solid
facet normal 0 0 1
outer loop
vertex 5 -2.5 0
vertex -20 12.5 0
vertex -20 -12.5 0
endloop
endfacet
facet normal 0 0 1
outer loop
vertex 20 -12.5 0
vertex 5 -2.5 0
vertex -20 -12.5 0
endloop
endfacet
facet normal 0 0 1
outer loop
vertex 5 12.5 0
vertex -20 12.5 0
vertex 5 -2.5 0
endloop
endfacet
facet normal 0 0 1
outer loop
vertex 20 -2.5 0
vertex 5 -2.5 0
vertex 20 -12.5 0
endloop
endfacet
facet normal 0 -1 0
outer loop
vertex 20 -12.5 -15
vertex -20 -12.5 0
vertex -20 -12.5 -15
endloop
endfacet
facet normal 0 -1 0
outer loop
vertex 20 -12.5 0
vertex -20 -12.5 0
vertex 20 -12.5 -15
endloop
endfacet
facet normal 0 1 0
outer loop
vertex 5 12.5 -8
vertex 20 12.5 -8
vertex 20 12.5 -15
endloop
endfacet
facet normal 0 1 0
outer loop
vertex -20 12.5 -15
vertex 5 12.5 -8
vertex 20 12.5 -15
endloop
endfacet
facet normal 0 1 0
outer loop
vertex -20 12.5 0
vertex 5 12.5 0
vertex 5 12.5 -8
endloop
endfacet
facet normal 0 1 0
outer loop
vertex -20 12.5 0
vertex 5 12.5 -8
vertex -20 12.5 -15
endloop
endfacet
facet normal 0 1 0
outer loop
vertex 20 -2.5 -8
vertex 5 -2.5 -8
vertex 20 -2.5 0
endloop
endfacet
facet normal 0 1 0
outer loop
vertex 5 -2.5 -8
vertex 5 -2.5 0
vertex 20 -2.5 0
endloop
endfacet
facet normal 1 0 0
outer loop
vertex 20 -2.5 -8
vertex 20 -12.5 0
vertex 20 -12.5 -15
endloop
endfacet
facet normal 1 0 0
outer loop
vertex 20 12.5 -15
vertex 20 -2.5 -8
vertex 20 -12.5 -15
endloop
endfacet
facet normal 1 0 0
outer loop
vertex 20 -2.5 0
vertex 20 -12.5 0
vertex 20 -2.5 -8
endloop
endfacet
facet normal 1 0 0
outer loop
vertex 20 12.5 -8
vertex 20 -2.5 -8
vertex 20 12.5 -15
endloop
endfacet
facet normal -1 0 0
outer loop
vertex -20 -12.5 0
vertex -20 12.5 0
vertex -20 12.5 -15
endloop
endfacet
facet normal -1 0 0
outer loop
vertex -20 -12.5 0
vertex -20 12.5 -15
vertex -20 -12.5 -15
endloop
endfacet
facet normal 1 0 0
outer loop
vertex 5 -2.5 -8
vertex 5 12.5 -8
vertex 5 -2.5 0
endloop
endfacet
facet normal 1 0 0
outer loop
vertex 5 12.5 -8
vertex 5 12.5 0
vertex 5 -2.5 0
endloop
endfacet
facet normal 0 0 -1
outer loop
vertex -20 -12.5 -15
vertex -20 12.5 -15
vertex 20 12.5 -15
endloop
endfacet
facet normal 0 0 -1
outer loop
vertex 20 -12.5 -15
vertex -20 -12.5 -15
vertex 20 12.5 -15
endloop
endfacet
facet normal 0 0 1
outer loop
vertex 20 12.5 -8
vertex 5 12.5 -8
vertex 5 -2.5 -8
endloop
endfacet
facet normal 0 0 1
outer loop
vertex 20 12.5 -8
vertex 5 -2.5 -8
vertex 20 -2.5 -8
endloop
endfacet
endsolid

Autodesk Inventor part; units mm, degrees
ref_plane "YZ Plane" through (0, 0, 0) normal (1, 0, 0) x (0, 1, 0)
ref_plane "XZ Plane" through (0, 0, 0) normal (0, 1, 0) x (-1, 0, 0)
ref_plane "XY Plane" through (0, 0, 0) normal (0, 0, 1) x (1, 0, 0)
sketch "Sketch1" plane through (0, 0, 0) normal (0, 0, 1) x (1, 0, 0)
  line L0 (-20, -12.5) -> (20, -12.5)
  line L1 (20, -12.5) -> (20, 12.5)
  line L2 (20, 12.5) -> (-20, 12.5)
  line L3 (-20, 12.5) -> (-20, -12.5)
  line L4 (-20, -12.5) -> (20, 12.5) construction
  line L5 (20, -12.5) -> (-20, 12.5) construction
  point P0 (0, 0)
  dimension "d0" = 40
  dimension "d1" = 25
extrude "Extrusion1" add sketch "Sketch1" against normal blind 15
sketch "Sketch2" plane through (0, 0, 0) normal (0, 0, 1) x (1, 0, 0)
  line L0 (20, 12.5) -> (20, -12.5) projected
  line L1 (20, 12.5) -> (5, 12.5)
  line L2 (5, 12.5) -> (5, -2.5)
  line L3 (5, -2.5) -> (20, -2.5)
  line L4 (20, -2.5) -> (20, 12.5)
  point P0 (0, 0)
  dimension "d4" = 15
  dimension "d5" = 15
extrude "Extrusion2" cut sketch "Sketch2" against normal blind 8
properties part number "desenho 2"
